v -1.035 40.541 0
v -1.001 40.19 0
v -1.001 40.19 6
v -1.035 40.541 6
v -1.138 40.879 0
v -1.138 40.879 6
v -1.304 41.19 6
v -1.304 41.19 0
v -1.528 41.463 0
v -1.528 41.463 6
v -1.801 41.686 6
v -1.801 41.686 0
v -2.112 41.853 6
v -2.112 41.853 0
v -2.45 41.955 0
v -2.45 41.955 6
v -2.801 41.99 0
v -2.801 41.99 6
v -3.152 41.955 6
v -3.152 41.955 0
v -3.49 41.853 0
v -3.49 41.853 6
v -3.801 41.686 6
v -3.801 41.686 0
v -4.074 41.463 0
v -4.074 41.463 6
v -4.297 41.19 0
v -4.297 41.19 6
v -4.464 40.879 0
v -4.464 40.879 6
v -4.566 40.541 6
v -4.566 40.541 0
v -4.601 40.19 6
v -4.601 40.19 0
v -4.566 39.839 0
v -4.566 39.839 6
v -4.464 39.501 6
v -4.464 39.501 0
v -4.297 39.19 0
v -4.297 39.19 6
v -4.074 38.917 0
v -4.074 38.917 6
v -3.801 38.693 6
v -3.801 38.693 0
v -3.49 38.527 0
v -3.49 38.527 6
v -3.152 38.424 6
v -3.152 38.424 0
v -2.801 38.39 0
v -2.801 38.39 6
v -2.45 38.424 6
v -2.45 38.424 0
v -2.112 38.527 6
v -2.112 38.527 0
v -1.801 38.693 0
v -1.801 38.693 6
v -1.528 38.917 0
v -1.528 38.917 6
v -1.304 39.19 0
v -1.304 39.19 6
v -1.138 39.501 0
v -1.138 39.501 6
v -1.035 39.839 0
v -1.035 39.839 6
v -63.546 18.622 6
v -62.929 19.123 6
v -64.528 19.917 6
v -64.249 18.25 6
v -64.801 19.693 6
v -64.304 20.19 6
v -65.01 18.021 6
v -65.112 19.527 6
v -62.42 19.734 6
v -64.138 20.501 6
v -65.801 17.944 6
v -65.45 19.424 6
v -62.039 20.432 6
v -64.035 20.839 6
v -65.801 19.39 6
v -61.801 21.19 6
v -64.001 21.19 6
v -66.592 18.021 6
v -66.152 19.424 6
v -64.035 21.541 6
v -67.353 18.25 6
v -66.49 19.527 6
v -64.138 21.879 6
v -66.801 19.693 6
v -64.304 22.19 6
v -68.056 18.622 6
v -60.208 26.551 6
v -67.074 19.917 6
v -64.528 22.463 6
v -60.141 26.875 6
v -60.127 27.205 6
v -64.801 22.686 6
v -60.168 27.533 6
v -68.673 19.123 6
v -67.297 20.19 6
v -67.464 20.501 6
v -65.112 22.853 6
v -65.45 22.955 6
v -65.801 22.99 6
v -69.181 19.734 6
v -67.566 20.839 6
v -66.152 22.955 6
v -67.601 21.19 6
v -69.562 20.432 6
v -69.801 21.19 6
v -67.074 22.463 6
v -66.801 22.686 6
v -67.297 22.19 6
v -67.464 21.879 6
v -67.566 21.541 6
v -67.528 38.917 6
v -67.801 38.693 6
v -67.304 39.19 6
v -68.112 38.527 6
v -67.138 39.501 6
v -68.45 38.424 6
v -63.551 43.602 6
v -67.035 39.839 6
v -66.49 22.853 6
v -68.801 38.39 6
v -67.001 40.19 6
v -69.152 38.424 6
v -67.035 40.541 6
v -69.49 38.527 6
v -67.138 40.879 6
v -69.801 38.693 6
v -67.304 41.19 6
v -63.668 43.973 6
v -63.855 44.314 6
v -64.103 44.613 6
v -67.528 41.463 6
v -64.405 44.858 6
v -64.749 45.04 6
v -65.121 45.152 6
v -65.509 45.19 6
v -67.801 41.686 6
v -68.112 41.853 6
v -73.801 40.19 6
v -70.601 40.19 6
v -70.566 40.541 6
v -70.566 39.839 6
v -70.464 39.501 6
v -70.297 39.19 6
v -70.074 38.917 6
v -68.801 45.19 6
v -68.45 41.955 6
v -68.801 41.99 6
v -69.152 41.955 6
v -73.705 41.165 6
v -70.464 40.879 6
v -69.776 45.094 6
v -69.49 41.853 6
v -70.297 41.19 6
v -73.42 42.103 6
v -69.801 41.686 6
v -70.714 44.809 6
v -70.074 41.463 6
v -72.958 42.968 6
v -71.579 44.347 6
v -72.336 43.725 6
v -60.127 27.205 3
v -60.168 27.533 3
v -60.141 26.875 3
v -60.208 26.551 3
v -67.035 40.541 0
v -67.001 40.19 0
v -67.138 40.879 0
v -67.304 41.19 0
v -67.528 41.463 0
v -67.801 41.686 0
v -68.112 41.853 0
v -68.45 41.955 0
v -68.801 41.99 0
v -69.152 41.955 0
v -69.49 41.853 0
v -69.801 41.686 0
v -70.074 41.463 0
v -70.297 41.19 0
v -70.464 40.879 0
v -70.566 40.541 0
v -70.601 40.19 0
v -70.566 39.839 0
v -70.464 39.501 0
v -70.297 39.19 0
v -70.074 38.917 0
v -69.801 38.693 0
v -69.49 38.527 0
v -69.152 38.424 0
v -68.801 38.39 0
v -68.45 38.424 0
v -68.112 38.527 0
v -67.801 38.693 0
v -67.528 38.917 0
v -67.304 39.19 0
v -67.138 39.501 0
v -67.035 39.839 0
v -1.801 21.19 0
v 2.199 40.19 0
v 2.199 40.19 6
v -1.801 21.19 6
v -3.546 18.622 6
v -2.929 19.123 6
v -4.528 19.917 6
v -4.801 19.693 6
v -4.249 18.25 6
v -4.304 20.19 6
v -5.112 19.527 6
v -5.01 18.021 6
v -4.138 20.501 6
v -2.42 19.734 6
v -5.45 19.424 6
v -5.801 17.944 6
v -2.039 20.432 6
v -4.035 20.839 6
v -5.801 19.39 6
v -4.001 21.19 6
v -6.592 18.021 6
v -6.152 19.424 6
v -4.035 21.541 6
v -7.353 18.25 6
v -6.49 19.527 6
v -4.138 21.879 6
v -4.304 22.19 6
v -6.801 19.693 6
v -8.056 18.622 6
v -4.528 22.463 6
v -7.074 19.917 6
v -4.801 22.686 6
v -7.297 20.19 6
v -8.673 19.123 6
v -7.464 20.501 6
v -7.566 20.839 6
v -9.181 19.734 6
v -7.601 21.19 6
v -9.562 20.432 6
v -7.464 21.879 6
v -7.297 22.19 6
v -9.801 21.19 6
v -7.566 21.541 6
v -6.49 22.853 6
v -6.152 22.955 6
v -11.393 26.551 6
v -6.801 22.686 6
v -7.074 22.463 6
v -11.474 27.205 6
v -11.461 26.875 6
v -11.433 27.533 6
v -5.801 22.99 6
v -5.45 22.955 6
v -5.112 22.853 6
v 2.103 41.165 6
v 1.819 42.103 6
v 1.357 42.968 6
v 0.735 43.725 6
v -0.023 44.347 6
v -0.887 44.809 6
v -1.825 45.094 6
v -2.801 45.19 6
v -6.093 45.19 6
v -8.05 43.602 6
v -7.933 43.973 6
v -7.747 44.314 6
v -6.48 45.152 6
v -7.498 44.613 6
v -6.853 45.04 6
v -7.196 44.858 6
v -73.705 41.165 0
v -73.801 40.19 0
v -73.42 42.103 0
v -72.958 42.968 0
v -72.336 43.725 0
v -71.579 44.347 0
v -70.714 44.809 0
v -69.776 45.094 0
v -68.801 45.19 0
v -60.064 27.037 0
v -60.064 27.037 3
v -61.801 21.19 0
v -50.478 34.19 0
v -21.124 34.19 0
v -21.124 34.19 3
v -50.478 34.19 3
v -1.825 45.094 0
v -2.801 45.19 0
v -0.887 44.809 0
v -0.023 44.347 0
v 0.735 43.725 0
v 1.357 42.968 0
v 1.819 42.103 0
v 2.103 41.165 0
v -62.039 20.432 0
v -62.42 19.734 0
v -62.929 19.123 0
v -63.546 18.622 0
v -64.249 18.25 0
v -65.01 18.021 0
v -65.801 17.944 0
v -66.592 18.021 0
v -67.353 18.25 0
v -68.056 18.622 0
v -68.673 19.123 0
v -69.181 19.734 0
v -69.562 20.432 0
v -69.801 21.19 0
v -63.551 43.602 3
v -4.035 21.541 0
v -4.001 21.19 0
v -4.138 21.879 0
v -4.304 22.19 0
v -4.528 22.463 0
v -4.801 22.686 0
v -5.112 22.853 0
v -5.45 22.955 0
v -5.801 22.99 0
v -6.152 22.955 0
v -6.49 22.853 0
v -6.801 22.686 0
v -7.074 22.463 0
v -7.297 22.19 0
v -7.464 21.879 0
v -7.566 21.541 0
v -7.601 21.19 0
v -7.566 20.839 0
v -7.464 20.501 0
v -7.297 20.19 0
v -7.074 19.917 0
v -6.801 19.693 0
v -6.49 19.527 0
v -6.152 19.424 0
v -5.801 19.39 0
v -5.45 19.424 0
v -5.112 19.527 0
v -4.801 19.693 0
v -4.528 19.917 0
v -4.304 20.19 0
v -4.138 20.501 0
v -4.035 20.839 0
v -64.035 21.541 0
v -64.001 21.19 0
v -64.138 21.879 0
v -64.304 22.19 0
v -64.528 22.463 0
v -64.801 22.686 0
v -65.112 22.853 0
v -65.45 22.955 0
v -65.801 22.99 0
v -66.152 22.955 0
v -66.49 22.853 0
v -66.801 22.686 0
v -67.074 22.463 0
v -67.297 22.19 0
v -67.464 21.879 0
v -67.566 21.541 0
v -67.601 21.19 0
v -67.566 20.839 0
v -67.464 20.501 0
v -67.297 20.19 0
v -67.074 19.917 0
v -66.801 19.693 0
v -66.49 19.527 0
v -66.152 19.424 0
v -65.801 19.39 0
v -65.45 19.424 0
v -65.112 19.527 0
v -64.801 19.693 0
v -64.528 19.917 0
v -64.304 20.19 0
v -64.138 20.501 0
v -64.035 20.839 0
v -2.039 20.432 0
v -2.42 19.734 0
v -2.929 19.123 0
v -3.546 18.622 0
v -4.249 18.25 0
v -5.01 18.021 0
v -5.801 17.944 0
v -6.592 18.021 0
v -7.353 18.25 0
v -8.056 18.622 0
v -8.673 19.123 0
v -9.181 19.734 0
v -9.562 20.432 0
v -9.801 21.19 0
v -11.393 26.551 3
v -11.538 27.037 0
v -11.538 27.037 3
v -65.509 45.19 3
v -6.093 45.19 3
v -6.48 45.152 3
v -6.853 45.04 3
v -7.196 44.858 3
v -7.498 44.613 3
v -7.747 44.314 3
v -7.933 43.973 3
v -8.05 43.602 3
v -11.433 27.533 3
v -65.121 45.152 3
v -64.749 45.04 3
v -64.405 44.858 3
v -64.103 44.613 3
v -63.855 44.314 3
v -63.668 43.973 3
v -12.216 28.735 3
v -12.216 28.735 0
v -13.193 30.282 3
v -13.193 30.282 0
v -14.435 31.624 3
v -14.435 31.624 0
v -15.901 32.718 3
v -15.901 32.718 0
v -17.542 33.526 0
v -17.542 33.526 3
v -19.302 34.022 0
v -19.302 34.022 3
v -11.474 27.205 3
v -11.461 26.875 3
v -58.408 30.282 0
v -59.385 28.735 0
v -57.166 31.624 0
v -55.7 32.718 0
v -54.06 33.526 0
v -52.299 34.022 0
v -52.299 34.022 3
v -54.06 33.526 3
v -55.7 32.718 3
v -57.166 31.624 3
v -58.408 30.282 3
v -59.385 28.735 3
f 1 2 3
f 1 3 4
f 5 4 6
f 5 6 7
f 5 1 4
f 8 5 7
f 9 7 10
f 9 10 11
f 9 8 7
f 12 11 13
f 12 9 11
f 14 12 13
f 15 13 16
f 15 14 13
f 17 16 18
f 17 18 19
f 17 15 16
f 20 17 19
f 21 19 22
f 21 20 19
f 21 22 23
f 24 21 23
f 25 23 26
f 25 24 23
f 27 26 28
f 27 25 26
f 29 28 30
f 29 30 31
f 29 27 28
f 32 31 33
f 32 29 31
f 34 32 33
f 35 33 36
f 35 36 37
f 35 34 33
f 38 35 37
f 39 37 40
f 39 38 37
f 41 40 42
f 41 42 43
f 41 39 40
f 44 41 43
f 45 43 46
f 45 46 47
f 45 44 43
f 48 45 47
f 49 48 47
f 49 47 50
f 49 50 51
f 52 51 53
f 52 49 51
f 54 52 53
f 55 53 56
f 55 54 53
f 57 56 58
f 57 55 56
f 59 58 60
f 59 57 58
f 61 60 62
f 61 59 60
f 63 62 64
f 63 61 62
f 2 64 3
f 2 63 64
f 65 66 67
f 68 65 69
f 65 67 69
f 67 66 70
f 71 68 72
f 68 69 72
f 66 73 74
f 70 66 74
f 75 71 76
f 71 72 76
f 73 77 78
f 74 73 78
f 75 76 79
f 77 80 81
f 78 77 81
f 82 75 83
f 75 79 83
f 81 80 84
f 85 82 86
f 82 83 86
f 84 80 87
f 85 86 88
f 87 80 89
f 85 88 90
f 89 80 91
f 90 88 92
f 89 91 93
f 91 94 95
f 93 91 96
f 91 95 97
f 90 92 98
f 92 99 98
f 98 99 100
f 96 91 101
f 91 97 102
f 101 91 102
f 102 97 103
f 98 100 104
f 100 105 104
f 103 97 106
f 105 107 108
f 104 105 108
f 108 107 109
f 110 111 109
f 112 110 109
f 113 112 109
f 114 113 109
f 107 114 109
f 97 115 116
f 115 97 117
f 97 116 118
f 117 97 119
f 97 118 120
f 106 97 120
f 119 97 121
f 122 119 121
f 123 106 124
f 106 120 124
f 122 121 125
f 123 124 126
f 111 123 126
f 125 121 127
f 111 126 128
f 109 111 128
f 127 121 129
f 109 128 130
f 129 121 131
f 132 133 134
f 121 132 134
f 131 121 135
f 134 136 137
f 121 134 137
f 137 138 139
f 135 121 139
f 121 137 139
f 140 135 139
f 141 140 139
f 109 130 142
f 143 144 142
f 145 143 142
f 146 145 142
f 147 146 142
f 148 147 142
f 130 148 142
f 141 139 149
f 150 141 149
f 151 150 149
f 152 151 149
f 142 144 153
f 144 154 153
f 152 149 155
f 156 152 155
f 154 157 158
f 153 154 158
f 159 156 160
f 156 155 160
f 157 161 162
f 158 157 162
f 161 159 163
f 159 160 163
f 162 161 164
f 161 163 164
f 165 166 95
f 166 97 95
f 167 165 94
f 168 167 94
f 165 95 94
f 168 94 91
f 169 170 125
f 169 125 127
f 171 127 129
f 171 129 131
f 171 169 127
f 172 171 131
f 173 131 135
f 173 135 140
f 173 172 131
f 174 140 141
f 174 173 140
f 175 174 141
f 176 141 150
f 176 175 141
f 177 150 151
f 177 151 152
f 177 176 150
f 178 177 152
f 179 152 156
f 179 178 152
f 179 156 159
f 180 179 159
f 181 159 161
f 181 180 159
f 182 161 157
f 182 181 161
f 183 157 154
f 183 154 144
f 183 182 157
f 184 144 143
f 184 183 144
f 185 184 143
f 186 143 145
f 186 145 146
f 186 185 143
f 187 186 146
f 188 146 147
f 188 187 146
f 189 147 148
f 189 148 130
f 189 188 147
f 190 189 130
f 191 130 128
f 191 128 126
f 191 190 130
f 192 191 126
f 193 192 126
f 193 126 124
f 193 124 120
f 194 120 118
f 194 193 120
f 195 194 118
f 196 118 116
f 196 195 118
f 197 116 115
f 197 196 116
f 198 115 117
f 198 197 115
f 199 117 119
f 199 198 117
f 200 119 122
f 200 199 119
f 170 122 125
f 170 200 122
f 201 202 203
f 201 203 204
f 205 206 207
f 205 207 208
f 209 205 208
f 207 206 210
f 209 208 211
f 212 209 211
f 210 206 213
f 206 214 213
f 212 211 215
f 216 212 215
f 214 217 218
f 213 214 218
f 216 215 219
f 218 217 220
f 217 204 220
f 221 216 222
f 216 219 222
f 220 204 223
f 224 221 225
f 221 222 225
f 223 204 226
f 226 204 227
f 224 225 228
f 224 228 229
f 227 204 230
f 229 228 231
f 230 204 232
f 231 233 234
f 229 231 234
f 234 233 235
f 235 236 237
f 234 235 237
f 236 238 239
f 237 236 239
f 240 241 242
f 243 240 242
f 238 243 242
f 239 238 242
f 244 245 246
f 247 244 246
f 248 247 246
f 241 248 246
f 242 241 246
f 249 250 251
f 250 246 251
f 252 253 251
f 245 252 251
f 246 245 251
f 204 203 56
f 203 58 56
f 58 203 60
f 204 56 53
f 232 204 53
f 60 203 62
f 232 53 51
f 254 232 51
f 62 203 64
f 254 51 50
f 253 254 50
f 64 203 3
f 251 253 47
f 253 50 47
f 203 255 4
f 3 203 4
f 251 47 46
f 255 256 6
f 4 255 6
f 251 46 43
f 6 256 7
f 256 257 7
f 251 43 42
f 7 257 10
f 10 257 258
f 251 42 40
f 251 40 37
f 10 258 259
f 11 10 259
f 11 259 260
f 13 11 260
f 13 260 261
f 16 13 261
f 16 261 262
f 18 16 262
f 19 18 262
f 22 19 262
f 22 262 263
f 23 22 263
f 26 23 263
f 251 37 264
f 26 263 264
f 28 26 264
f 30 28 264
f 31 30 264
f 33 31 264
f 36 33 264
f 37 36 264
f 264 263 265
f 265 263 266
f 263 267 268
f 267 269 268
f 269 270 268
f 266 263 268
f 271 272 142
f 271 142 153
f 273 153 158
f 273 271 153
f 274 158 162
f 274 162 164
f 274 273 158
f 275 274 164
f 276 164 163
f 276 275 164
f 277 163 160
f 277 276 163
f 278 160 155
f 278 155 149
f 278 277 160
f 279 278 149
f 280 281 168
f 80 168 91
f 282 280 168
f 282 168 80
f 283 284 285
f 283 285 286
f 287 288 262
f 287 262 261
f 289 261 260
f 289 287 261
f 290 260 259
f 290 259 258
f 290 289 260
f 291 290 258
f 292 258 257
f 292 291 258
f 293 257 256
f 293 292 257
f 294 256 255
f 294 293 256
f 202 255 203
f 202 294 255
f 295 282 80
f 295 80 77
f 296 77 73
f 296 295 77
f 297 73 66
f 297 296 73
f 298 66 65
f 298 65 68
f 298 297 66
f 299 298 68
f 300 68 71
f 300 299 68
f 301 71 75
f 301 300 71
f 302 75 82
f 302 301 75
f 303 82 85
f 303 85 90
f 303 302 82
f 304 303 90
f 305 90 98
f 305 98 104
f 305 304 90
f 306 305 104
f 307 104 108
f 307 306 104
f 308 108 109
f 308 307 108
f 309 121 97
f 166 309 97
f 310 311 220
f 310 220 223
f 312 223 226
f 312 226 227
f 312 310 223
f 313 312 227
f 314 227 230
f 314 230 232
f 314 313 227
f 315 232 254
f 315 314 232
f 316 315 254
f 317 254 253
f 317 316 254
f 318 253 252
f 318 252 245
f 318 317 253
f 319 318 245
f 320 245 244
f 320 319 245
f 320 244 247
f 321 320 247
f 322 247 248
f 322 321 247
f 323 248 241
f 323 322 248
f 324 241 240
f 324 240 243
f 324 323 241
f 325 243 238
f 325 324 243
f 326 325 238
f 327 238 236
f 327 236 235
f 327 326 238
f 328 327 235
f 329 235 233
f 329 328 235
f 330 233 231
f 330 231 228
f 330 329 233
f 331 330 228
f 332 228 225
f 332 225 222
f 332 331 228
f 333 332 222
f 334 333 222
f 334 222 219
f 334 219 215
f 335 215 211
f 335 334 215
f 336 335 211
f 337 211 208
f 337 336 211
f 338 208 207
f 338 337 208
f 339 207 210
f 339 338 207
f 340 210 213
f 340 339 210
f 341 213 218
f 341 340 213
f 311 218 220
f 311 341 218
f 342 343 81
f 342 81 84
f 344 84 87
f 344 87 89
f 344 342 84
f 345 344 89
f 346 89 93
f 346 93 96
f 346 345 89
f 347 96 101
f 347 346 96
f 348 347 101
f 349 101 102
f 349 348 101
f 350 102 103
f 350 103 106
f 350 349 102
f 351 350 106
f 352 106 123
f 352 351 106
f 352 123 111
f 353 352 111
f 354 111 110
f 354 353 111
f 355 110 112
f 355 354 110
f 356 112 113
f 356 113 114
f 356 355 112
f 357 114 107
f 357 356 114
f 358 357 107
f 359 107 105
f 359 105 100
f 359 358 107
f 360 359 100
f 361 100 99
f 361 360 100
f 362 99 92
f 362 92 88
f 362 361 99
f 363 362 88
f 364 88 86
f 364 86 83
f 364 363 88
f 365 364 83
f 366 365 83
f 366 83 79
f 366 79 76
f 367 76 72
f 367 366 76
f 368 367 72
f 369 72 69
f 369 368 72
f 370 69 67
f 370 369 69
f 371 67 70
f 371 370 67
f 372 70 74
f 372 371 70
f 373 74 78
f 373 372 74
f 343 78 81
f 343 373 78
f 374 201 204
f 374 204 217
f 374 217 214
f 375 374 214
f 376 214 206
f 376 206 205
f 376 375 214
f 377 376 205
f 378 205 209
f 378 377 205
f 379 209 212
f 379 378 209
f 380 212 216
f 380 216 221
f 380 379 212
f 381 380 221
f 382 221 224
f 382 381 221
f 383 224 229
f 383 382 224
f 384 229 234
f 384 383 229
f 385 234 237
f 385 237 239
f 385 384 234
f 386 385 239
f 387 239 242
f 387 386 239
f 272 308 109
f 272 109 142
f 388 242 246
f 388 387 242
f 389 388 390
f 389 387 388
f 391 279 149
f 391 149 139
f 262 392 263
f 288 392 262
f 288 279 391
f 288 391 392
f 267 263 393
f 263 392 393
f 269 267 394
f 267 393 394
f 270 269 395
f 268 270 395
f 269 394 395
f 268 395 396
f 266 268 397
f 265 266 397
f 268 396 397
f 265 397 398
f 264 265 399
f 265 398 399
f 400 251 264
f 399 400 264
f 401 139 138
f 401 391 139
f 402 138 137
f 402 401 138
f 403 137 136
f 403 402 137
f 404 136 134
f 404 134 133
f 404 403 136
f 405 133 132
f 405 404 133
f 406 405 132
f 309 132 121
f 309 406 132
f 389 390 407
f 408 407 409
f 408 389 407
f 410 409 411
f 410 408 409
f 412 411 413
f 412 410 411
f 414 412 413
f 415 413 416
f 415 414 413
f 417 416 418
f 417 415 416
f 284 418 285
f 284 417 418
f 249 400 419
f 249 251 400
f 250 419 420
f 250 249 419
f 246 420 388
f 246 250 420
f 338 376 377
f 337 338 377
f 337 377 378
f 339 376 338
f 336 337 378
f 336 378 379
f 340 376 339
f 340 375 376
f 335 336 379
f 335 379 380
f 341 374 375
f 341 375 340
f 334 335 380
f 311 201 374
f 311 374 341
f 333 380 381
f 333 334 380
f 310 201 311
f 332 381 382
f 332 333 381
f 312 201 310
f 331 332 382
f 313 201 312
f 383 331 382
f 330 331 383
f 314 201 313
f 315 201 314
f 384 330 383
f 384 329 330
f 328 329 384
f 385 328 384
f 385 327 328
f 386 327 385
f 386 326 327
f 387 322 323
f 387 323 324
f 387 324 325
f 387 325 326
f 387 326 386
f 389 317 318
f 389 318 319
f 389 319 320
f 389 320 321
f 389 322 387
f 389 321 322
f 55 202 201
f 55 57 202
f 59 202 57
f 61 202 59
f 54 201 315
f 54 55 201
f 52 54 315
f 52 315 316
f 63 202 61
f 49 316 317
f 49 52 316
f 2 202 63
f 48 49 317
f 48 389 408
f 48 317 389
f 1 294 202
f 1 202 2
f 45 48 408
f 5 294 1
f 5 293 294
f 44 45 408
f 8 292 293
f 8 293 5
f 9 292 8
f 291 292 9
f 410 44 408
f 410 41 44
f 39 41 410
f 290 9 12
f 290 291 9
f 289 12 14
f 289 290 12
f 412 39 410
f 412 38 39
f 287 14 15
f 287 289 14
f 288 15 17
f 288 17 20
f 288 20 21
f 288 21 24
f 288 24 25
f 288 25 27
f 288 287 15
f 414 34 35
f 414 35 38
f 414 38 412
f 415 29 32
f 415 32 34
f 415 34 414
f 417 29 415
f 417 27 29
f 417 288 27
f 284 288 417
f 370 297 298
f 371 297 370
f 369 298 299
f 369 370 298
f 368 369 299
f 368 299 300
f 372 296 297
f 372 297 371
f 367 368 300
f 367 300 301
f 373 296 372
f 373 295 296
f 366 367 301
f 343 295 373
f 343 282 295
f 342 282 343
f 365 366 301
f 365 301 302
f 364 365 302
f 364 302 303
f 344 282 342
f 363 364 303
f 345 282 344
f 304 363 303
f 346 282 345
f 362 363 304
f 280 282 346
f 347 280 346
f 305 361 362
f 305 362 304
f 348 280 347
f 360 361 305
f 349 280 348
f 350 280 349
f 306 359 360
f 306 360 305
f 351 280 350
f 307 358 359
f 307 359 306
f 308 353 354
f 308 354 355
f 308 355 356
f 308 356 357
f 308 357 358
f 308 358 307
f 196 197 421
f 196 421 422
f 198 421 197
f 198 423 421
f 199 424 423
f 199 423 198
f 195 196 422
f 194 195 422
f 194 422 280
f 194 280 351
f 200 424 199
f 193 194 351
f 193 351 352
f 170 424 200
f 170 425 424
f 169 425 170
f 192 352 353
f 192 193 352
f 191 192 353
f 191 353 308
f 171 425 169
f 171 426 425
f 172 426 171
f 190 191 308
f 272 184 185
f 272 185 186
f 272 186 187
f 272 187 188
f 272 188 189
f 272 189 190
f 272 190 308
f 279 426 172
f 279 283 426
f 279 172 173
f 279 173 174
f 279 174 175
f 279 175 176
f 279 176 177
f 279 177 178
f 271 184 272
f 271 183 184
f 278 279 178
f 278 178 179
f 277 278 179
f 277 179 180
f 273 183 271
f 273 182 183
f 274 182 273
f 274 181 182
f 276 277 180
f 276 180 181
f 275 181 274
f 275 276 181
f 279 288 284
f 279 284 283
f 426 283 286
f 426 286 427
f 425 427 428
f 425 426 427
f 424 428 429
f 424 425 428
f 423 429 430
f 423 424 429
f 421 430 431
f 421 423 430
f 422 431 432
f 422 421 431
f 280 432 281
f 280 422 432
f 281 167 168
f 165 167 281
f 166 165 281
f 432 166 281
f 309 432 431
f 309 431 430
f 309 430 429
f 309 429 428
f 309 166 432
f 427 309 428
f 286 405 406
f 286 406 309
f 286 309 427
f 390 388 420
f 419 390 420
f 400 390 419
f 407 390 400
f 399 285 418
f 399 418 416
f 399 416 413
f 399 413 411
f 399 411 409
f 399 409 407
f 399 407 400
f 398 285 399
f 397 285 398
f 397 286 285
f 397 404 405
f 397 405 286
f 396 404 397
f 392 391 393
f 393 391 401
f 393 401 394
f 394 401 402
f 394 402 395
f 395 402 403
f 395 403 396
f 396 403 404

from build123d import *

# Parameters (mm, degrees)
SKETCH_1_R          = 1.8
EXTRUDE_1_DEPTH     = 6
CUT_EXTRUDE_1_DEPTH = 3
FILLET_1_R          = 2


with BuildPart() as part:
    # ｽｹｯﾁ1 → ﾎﾞｽ - 押し出し1 (new body)
    with BuildSketch(Plane.XY):
        with BuildLine():
            Line((-68.800816256, 45.189746609), (-2.800816256, 45.189746609))
            ThreePointArc((-2.800816256, 45.189746609), (0.73471765, 43.725280515), (2.199183744, 40.189746609))
            Line((2.199183744, 40.189746609), (-1.800816256, 21.189746609))
            ThreePointArc((-1.800816256, 21.189746609), (-5.800816256, 17.944170221), (-9.800816256, 21.189746609))
            Line((-9.800816256, 21.189746609), (-11.537510812, 27.036945787))
            ThreePointArc((-11.537510812, 27.036945787), (-15.143316964, 32.20448278), (-21.123618303, 34.189746609))
            Line((-21.123618303, 34.189746609), (-50.478014208, 34.189746609))
            ThreePointArc((-50.478014208, 34.189746609), (-56.458315547, 32.20448278), (-60.0641217, 27.036945787))
            Line((-60.0641217, 27.036945787), (-61.800816256, 21.189746609))
            ThreePointArc((-61.800816256, 21.189746609), (-65.800816256, 17.944170221), (-69.800816256, 21.189746609))
            Line((-69.800816256, 21.189746609), (-73.800816256, 40.189746609))
            ThreePointArc((-73.800816256, 40.189746609), (-72.336350162, 43.725280515), (-68.800816256, 45.189746609))
        make_face()
        with Locations((-68.800816256, 40.189746609)):
            Circle(SKETCH_1_R, mode=Mode.SUBTRACT)
        with Locations((-65.800816256, 21.189746609)):
            Circle(SKETCH_1_R, mode=Mode.SUBTRACT)
        with Locations((-5.800816256, 21.189746609)):
            Circle(SKETCH_1_R, mode=Mode.SUBTRACT)
        with Locations((-2.800816256, 40.189746609)):
            Circle(SKETCH_1_R, mode=Mode.SUBTRACT)
    extrude(amount=EXTRUDE_1_DEPTH)

    # ｽｹｯﾁ2 → ｶｯﾄ - 押し出し1 (cut)
    with BuildSketch(Plane.XY.offset(6)):
        Polygon((-60.0641217, 27.036945787), (-11.537510812, 27.036945787), (-7.715868533, 45.189746609), (-63.885763978, 45.189746609), align=None)
    extrude(amount=-CUT_EXTRUDE_1_DEPTH, mode=Mode.SUBTRACT)

    # ﾌｨﾚｯﾄ1
    fillet_1_edges = [part.edges().sort_by_distance(p)[0] for p in [
        (-11.537510812, 27.036945787, 4.5),
        (-60.0641217, 27.036945787, 4.5),
        (-63.885763978, 45.189746609, 4.5),
        (-7.715868533, 45.189746609, 4.5),
    ]]
    fillet(fillet_1_edges, radius=FILLET_1_R)


solid = part.part
